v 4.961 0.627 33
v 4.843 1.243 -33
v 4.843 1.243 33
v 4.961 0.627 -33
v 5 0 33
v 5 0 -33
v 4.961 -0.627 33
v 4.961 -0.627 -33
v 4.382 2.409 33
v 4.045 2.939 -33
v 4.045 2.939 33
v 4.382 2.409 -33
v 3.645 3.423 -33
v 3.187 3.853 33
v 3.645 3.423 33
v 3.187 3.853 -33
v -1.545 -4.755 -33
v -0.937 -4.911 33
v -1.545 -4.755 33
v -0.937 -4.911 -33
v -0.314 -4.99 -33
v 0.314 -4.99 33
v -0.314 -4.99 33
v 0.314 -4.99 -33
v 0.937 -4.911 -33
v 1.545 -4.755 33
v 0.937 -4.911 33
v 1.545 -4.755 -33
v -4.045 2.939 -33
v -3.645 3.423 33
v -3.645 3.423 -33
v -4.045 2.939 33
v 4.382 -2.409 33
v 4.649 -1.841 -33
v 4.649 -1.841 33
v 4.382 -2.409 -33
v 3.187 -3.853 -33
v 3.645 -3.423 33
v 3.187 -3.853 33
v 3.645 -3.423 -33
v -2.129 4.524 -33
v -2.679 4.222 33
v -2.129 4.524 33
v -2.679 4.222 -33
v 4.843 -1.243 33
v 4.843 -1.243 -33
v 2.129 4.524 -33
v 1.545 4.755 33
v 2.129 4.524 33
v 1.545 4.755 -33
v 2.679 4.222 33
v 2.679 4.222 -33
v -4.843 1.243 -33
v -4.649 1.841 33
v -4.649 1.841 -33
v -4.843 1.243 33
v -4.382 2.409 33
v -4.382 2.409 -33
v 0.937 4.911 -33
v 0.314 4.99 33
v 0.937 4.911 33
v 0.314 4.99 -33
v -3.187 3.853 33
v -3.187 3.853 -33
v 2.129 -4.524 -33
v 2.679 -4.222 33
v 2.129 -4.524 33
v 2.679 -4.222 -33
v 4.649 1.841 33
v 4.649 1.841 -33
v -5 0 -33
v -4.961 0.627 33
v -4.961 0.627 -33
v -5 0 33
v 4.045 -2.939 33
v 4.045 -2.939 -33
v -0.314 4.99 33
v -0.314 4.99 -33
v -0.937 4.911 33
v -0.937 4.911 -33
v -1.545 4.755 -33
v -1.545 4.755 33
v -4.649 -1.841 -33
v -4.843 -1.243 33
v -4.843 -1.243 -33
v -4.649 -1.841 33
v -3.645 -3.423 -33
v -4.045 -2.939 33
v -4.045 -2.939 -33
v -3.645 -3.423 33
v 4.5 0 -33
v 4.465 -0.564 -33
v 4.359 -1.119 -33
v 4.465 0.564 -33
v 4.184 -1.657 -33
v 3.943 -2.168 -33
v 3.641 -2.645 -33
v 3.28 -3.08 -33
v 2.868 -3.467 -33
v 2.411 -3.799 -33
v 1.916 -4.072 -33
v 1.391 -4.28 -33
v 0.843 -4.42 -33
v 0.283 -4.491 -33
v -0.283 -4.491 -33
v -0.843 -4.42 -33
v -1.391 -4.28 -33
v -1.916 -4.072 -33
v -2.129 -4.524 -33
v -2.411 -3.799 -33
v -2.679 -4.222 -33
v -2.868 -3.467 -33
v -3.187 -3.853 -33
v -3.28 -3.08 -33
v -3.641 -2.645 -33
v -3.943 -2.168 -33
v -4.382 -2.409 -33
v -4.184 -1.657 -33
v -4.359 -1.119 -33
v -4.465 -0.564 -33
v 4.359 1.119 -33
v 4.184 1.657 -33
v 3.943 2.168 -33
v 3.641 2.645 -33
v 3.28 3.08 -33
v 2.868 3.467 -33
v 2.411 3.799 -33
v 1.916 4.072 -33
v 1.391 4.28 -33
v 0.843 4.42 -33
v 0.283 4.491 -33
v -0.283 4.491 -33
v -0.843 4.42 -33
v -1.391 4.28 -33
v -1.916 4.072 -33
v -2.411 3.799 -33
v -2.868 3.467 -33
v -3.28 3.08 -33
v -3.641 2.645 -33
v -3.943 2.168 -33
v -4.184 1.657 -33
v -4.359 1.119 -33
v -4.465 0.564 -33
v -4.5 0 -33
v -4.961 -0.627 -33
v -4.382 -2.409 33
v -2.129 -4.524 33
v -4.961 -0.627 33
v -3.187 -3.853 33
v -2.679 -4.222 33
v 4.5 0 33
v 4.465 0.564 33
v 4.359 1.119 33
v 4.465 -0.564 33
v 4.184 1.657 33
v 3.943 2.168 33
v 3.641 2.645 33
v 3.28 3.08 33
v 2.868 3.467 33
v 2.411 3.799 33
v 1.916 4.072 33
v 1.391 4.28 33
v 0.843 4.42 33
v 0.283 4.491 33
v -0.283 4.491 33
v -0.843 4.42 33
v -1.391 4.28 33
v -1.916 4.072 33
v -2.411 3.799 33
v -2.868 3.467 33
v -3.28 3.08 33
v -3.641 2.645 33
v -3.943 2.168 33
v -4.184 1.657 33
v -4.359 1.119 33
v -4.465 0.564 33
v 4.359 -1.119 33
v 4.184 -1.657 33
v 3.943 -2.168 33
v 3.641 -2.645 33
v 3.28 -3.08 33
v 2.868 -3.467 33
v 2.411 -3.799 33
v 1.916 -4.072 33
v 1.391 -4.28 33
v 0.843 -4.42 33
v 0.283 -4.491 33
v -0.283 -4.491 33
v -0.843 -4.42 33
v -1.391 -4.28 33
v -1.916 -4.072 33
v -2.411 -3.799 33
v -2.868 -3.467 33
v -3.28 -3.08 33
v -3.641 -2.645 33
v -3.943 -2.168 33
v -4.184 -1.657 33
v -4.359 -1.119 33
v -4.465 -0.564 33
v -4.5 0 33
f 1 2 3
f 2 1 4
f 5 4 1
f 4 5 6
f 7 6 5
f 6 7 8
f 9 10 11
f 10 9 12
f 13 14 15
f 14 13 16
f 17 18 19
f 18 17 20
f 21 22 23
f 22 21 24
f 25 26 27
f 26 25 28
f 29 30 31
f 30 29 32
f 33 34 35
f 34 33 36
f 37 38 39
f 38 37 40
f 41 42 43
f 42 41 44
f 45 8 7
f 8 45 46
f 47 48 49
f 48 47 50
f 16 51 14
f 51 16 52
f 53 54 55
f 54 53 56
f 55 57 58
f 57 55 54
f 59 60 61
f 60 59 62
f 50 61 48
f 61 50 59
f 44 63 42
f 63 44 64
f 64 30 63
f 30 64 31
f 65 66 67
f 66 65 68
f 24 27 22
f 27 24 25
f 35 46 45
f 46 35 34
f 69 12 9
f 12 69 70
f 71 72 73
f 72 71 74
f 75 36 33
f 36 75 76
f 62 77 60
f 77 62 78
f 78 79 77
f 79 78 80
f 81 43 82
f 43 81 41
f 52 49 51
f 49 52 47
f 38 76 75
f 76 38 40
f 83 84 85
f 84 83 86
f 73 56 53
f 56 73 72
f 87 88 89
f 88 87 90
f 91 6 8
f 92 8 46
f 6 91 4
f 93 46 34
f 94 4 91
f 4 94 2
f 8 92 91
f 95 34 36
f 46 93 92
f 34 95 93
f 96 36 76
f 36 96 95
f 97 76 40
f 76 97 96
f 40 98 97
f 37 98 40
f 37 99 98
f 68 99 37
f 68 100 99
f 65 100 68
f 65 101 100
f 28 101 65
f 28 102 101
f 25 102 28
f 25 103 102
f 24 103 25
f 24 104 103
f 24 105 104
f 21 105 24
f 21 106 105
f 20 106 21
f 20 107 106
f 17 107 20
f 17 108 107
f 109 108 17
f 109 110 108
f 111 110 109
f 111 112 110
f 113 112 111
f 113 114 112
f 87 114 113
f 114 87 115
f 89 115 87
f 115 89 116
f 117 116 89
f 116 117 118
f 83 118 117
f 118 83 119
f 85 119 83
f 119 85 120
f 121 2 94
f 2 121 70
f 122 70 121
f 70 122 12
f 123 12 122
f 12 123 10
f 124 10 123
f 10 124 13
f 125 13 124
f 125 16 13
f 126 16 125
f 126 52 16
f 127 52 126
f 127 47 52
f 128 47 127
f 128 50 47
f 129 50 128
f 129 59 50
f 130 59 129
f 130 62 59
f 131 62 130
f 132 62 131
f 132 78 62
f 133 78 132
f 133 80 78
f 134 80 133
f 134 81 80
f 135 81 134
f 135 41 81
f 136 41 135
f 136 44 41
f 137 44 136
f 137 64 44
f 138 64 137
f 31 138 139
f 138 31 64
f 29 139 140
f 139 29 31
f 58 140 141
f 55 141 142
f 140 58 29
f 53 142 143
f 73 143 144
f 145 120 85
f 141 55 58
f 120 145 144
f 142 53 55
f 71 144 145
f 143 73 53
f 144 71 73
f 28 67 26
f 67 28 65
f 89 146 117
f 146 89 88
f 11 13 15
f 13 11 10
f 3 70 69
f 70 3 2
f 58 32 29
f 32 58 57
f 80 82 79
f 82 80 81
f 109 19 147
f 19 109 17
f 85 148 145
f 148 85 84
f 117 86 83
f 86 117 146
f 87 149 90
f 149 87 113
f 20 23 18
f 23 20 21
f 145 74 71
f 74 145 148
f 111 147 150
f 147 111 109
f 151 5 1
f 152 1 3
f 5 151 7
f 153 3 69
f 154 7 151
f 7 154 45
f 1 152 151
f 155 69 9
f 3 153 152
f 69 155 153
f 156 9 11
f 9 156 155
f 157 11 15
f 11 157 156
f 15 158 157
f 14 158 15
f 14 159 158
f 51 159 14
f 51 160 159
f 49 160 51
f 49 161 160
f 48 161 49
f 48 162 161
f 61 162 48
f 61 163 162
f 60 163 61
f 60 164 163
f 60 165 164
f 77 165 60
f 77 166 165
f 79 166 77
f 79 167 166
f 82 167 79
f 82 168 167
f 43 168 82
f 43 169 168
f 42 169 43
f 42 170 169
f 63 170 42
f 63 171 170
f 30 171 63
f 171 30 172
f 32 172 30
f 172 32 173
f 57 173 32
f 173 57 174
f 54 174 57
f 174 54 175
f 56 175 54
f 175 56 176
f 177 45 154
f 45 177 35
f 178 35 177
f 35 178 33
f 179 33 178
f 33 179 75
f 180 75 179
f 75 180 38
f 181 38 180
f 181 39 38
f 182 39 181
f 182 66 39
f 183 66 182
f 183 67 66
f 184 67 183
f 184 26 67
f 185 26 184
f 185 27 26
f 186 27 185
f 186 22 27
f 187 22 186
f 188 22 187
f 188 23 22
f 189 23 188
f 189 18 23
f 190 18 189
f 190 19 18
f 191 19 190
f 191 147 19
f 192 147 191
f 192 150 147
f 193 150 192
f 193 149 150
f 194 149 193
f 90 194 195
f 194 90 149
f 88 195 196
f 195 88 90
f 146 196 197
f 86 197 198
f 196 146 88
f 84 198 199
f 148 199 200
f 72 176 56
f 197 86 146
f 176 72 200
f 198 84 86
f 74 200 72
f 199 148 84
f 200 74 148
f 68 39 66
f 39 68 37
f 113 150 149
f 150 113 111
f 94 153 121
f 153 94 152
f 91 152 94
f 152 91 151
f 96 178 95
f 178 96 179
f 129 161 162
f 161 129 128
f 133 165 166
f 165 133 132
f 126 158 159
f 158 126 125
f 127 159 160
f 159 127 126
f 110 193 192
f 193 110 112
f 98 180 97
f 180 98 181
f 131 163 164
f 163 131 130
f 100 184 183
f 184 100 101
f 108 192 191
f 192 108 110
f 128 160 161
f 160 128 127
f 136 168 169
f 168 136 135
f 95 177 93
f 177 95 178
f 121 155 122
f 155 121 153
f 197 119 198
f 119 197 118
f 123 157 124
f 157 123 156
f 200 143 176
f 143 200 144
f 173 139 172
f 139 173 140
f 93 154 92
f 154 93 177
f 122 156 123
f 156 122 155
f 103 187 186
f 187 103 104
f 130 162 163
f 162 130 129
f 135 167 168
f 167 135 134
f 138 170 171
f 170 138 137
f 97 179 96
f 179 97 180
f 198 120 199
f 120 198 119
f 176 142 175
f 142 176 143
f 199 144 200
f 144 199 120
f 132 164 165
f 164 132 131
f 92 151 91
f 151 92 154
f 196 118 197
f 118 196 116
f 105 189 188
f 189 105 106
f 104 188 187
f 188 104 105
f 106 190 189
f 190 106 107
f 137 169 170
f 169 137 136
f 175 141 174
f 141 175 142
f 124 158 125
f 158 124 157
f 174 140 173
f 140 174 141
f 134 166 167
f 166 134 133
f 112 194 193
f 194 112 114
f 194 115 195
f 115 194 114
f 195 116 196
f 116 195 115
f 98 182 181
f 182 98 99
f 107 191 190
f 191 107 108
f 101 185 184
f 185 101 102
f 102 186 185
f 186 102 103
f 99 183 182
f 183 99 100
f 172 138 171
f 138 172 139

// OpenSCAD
$fn = 50;


difference() {
	union() {
		translate(v = [0, 0, -33.0000000000]) {
			cylinder(h = 66, r = 5.0000000000);
		}
	}
	union() {
		translate(v = [0, 0, -100.0000000000]) {
			cylinder(h = 200, r = 4.5000000000);
		}
	}
}
